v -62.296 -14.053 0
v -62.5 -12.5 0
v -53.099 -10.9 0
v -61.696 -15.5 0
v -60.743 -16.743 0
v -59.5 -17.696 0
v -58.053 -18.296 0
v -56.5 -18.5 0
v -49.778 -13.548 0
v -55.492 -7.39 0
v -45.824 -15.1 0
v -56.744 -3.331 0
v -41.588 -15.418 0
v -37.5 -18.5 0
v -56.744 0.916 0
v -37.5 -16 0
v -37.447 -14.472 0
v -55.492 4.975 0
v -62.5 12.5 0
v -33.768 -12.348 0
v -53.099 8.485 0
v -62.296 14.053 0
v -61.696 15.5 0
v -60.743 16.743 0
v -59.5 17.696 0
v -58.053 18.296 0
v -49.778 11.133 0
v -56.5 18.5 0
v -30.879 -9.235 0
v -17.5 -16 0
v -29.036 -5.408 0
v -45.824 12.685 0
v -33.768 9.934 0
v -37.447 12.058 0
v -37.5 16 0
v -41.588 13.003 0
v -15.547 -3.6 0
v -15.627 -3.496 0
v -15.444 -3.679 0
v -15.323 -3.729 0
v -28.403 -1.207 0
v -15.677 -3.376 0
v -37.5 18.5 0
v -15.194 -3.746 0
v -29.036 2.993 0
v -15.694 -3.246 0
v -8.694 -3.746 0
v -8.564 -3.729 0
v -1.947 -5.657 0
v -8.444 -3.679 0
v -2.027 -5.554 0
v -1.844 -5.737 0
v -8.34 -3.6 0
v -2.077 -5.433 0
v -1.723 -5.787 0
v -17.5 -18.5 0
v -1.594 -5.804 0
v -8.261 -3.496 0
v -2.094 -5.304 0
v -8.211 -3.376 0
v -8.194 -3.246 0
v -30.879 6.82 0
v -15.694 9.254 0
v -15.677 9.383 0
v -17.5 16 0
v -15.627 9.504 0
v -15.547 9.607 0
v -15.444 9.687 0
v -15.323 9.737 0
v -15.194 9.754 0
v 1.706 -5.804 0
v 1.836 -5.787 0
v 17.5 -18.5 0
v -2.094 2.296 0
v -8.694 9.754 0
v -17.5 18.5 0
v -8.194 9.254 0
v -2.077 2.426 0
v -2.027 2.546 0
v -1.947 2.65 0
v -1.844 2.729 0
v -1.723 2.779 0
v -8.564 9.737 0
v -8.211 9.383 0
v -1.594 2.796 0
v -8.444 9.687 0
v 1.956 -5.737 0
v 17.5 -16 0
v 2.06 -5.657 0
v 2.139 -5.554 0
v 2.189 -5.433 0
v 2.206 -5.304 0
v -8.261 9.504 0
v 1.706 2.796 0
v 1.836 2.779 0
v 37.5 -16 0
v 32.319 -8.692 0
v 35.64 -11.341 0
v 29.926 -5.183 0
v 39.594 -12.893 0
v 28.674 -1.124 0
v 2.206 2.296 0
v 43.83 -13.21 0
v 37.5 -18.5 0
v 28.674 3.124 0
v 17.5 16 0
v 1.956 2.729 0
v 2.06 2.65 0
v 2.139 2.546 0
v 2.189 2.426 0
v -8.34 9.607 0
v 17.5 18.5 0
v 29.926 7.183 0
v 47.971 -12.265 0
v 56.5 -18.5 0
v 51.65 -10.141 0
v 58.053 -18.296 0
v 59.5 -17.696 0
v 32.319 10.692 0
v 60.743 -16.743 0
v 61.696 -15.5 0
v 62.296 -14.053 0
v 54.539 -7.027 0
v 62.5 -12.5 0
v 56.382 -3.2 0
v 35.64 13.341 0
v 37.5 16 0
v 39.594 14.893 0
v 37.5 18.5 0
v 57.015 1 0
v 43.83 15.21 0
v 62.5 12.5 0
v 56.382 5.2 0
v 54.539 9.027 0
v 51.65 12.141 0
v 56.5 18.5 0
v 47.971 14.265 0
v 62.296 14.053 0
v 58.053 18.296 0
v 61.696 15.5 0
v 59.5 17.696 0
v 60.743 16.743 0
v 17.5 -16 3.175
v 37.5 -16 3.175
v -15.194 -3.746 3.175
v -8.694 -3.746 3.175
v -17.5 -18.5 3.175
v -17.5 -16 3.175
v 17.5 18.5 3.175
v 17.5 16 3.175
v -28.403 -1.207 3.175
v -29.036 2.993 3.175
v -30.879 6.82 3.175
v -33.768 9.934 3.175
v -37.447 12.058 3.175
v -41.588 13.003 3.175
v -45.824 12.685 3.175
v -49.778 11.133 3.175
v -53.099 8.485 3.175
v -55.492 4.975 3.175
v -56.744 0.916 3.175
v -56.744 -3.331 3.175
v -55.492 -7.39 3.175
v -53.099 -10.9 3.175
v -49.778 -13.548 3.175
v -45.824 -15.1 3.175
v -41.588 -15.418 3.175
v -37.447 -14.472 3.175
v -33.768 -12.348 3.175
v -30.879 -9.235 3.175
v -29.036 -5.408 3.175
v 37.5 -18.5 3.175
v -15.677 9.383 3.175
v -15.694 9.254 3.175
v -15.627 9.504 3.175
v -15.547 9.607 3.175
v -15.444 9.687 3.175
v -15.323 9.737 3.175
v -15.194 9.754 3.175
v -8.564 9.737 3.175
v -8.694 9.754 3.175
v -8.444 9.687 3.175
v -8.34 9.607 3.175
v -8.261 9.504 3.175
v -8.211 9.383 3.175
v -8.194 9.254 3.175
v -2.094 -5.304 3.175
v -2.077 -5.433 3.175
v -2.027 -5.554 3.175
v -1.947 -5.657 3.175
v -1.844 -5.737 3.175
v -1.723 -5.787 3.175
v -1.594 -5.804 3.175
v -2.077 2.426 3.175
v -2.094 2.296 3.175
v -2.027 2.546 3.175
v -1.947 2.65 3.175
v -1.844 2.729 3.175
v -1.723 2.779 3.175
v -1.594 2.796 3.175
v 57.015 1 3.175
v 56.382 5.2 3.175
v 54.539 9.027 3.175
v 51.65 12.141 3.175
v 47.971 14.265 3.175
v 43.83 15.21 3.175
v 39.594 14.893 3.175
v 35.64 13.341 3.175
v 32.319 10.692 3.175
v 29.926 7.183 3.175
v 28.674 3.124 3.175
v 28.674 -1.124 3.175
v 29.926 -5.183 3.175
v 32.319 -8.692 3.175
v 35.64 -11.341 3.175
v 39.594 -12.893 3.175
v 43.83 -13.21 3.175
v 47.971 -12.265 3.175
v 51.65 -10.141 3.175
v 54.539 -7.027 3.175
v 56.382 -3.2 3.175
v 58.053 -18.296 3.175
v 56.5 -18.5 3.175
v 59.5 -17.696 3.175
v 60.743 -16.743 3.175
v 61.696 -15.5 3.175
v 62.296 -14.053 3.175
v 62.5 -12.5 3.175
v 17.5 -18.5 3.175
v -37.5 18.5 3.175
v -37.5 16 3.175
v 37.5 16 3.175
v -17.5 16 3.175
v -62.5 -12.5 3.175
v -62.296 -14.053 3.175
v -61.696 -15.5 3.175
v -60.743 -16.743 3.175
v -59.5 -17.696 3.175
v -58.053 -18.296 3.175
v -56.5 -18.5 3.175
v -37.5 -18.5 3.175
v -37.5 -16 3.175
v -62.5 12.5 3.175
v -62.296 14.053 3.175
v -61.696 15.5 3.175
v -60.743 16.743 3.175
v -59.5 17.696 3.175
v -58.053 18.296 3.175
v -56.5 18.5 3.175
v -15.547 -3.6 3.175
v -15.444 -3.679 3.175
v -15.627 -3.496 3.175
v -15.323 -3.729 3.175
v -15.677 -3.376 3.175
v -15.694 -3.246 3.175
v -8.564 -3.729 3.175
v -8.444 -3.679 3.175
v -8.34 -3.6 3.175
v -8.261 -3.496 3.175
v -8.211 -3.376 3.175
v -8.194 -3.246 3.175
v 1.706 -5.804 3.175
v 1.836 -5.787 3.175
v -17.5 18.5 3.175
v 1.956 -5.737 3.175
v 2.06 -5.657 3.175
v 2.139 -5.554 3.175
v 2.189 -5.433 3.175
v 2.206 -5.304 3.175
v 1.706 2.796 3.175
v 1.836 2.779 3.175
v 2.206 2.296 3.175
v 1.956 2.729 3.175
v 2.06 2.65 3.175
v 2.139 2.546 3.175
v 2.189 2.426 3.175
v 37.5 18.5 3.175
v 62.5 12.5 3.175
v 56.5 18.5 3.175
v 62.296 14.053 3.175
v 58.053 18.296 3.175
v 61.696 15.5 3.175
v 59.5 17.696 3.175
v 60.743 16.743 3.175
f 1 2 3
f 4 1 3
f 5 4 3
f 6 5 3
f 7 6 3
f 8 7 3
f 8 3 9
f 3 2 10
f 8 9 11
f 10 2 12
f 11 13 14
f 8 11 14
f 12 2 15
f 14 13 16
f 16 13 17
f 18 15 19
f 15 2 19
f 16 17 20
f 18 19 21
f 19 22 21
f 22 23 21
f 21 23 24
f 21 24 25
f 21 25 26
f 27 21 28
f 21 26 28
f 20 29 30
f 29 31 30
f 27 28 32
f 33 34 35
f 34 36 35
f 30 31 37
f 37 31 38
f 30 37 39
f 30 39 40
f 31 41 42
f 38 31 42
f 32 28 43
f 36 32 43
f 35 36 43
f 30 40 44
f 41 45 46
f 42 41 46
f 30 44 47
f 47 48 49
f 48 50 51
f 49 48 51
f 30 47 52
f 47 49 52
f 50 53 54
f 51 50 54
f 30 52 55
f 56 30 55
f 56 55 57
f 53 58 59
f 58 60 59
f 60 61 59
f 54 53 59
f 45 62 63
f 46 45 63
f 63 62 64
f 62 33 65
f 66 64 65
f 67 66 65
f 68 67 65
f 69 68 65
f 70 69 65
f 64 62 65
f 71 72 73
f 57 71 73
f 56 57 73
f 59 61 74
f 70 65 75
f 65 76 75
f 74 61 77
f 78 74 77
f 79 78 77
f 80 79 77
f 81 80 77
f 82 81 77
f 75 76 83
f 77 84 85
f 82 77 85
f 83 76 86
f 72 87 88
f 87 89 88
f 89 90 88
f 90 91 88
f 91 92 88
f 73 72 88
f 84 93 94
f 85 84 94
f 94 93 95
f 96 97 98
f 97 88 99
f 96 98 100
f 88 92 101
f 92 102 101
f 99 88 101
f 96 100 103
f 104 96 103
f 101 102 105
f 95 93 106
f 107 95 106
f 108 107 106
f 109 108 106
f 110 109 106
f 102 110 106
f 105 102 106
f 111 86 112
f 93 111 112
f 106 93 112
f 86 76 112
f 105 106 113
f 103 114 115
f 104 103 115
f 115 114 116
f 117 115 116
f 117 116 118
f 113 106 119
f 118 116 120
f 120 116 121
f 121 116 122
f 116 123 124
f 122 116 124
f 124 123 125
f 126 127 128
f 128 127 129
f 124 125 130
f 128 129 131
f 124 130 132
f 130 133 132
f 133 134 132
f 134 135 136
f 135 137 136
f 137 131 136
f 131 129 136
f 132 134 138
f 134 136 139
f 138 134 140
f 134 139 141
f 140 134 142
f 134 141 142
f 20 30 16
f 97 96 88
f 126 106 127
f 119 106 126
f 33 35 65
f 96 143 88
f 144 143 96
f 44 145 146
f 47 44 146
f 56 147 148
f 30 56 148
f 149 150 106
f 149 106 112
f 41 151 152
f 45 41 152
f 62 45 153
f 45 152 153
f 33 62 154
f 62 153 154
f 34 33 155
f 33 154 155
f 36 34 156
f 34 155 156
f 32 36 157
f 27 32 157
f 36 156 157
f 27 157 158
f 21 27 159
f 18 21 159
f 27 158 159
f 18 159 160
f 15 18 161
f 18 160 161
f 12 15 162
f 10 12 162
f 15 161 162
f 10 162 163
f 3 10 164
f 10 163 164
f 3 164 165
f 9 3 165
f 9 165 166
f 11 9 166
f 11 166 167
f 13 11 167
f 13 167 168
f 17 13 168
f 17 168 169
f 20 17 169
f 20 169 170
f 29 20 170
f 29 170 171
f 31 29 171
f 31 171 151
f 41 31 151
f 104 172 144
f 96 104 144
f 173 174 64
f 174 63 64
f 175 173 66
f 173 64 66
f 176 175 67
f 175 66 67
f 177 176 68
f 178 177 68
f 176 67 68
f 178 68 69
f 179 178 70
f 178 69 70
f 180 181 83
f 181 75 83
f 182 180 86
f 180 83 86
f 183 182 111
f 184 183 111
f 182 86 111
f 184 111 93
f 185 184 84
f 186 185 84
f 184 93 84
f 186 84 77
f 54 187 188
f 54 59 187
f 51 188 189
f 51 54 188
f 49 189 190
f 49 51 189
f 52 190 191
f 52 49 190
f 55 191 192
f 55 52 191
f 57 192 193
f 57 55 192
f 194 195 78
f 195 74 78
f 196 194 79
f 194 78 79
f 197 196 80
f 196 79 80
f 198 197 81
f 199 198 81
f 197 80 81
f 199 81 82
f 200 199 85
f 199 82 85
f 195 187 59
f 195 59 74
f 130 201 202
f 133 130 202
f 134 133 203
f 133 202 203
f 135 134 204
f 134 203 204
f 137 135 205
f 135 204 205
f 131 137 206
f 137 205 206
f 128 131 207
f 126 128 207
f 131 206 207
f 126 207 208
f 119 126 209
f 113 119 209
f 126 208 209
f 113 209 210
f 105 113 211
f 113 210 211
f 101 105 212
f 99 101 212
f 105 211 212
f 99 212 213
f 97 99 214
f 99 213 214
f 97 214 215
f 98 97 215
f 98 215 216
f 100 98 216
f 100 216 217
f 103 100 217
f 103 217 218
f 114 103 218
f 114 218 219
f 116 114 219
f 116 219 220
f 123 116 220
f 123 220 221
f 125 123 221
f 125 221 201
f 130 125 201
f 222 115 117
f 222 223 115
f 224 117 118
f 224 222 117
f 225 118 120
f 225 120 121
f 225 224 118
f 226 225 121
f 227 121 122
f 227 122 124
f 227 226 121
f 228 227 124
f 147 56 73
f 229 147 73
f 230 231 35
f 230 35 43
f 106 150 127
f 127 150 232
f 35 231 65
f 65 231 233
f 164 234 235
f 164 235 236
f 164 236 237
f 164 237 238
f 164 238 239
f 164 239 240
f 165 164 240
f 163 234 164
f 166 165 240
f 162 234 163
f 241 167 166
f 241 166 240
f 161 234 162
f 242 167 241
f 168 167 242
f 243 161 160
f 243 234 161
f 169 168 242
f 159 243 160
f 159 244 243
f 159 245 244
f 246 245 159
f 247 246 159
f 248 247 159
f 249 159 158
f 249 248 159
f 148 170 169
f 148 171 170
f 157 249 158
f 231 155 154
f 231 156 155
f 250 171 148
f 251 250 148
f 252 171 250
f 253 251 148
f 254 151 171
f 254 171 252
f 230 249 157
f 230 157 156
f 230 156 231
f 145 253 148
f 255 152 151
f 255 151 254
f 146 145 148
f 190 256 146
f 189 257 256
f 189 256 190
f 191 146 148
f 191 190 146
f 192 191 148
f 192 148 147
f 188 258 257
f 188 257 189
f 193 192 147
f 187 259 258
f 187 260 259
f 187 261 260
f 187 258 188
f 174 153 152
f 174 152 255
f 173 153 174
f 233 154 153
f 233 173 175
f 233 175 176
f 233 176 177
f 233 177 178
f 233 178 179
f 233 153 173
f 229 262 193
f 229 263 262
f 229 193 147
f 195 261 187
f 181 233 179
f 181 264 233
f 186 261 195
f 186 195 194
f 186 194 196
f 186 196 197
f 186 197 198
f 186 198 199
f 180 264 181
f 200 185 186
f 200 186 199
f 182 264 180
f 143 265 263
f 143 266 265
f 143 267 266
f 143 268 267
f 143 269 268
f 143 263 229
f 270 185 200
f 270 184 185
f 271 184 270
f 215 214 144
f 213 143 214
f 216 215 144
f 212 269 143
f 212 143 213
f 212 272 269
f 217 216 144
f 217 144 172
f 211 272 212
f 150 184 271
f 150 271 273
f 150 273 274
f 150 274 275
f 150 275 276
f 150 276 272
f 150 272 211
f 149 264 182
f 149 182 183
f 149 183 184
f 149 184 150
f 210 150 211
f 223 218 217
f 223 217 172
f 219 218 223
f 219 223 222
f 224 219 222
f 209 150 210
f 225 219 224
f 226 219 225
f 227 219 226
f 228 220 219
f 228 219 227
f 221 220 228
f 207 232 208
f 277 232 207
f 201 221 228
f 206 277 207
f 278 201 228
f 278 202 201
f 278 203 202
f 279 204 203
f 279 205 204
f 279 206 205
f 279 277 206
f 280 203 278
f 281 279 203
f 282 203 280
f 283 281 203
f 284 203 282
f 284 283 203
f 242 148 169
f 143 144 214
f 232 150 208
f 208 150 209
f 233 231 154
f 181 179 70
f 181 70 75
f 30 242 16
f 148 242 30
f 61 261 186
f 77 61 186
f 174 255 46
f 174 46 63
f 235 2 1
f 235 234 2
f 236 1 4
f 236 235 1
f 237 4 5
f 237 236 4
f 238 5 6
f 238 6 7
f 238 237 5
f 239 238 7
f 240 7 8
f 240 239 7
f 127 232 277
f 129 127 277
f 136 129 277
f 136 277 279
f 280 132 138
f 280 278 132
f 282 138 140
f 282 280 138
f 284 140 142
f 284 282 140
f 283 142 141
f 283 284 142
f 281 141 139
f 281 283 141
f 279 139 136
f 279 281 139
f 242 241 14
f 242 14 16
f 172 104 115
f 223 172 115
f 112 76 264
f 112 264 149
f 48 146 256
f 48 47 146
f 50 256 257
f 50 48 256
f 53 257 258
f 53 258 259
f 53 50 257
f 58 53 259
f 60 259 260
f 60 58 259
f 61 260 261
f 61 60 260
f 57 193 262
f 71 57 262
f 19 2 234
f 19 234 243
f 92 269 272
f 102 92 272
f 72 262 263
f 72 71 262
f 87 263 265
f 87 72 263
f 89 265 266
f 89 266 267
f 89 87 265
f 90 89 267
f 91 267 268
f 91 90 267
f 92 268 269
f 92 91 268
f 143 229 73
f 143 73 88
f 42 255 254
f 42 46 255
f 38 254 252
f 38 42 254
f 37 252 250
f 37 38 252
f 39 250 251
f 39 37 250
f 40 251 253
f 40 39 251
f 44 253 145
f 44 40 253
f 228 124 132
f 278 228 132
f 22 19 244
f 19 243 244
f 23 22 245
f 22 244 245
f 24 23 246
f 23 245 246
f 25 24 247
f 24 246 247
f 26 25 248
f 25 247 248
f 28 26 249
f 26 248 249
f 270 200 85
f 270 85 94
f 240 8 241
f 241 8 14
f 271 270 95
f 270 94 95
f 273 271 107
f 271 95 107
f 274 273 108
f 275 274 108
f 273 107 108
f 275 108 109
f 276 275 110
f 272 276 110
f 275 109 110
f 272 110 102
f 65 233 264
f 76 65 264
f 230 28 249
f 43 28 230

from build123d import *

# Parameters (mm, degrees)
SKETCH1_W           = 125
SKETCH1_H           = 37
BOSS_EXTRUDE1_DEPTH = 3.175
FILLET1_R           = 6
CUT_EXTRUDE1_REACH  = 5.175
SKETCH3_R           = 14.25
SKETCH3_W           = 4.3
SKETCH3_H           = 8.6
SKETCH3_W_2         = 7.5
SKETCH3_H_2         = 13.5
SKETCH6_W           = 20
SKETCH6_H           = 2.5
CUT_EXTRUDE2_DEPTH  = 4.175
FILLET2_R           = 0.5


with BuildPart() as part:
    # Sketch1 → Boss-Extrude1 (new body)
    with BuildSketch(Plane.XY):
        Rectangle(SKETCH1_W, SKETCH1_H)
    extrude(amount=BOSS_EXTRUDE1_DEPTH)

    # Fillet1
    fillet1_edges = [part.edges().sort_by_distance(p)[0] for p in [
        (62.5, -18.5, 1.5875),
        (-62.5, -18.5, 1.5875),
        (-62.5, 18.5, 1.5875),
        (62.5, 18.5, 1.5875),
    ]]
    fillet(fillet1_edges, radius=FILLET1_R)

    # Sketch3 → Cut-Extrude1 (cut, up to next)
    with BuildSketch(Plane.XY.offset(3.175), mode=Mode.PRIVATE) as cut_extrude1_sk1:
        with Locations((42.7653, 1)):
            Circle(SKETCH3_R)
    cut_extrude1_tool1 = extrude(cut_extrude1_sk1.sketch, amount=-CUT_EXTRUDE1_REACH, mode=Mode.PRIVATE) & part.part
    add(cut_extrude1_tool1.solids().sort_by_distance((42.7653, 1, 3.175))[0], mode=Mode.SUBTRACT)
    # Sketch3 → Cut-Extrude1 (cut, up to next)
    with BuildSketch(Plane.XY.offset(3.175), mode=Mode.PRIVATE) as cut_extrude1_sk2:
        with Locations((-42.6527, -1.2074)):
            Circle(SKETCH3_R)
    cut_extrude1_tool2 = extrude(cut_extrude1_sk2.sketch, amount=-CUT_EXTRUDE1_REACH, mode=Mode.PRIVATE) & part.part
    add(cut_extrude1_tool2.solids().sort_by_distance((-42.6527, -1.2074, 3.175))[0], mode=Mode.SUBTRACT)
    # Sketch3 → Cut-Extrude1 (cut, up to next)
    with BuildSketch(Plane.XY.offset(3.175), mode=Mode.PRIVATE) as cut_extrude1_sk3:
        with Locations((0.0563, -1.5037)):
            Rectangle(SKETCH3_W, SKETCH3_H)
    cut_extrude1_tool3 = extrude(cut_extrude1_sk3.sketch, amount=-CUT_EXTRUDE1_REACH, mode=Mode.PRIVATE) & part.part
    add(cut_extrude1_tool3.solids().sort_by_distance((0.0563, -1.5037, 3.175))[0], mode=Mode.SUBTRACT)
    # Sketch3 → Cut-Extrude1 (cut, up to next)
    with BuildSketch(Plane.XY.offset(3.175), mode=Mode.PRIVATE) as cut_extrude1_sk4:
        with Locations((-11.9437, 3.003839217)):
            Rectangle(SKETCH3_W_2, SKETCH3_H_2)
    cut_extrude1_tool4 = extrude(cut_extrude1_sk4.sketch, amount=-CUT_EXTRUDE1_REACH, mode=Mode.PRIVATE) & part.part
    add(cut_extrude1_tool4.solids().sort_by_distance((-11.9437, 3.003839, 3.175))[0], mode=Mode.SUBTRACT)

    # Sketch6 → Cut-Extrude2 (cut, through all)
    with BuildSketch(Plane.XY.offset(3.175)):
        with Locations((27.5, -17.25)):
            Rectangle(SKETCH6_W, SKETCH6_H)
        with Locations((-27.5, -17.25)):
            Rectangle(SKETCH6_W, SKETCH6_H)
        with Locations((-27.5, 17.25)):
            Rectangle(SKETCH6_W, SKETCH6_H)
        with Locations((27.5, 17.25)):
            Rectangle(SKETCH6_W, SKETCH6_H)
    extrude(amount=-CUT_EXTRUDE2_DEPTH, mode=Mode.SUBTRACT)

    # Fillet2
    fillet2_edges = [part.edges().sort_by_distance(p)[0] for p in [
        (-15.6937, -3.746160783, 1.5875),
        (-15.6937, 9.753839217, 1.5875),
        (-8.1937, 9.753839217, 1.5875),
        (-8.1937, -3.746160783, 1.5875),
        (2.2063, 2.7963, 1.5875),
        (2.2063, -5.8037, 1.5875),
        (-2.0937, -5.8037, 1.5875),
        (-2.0937, 2.7963, 1.5875),
    ]]
    fillet(fillet2_edges, radius=FILLET2_R)


solid = part.part
